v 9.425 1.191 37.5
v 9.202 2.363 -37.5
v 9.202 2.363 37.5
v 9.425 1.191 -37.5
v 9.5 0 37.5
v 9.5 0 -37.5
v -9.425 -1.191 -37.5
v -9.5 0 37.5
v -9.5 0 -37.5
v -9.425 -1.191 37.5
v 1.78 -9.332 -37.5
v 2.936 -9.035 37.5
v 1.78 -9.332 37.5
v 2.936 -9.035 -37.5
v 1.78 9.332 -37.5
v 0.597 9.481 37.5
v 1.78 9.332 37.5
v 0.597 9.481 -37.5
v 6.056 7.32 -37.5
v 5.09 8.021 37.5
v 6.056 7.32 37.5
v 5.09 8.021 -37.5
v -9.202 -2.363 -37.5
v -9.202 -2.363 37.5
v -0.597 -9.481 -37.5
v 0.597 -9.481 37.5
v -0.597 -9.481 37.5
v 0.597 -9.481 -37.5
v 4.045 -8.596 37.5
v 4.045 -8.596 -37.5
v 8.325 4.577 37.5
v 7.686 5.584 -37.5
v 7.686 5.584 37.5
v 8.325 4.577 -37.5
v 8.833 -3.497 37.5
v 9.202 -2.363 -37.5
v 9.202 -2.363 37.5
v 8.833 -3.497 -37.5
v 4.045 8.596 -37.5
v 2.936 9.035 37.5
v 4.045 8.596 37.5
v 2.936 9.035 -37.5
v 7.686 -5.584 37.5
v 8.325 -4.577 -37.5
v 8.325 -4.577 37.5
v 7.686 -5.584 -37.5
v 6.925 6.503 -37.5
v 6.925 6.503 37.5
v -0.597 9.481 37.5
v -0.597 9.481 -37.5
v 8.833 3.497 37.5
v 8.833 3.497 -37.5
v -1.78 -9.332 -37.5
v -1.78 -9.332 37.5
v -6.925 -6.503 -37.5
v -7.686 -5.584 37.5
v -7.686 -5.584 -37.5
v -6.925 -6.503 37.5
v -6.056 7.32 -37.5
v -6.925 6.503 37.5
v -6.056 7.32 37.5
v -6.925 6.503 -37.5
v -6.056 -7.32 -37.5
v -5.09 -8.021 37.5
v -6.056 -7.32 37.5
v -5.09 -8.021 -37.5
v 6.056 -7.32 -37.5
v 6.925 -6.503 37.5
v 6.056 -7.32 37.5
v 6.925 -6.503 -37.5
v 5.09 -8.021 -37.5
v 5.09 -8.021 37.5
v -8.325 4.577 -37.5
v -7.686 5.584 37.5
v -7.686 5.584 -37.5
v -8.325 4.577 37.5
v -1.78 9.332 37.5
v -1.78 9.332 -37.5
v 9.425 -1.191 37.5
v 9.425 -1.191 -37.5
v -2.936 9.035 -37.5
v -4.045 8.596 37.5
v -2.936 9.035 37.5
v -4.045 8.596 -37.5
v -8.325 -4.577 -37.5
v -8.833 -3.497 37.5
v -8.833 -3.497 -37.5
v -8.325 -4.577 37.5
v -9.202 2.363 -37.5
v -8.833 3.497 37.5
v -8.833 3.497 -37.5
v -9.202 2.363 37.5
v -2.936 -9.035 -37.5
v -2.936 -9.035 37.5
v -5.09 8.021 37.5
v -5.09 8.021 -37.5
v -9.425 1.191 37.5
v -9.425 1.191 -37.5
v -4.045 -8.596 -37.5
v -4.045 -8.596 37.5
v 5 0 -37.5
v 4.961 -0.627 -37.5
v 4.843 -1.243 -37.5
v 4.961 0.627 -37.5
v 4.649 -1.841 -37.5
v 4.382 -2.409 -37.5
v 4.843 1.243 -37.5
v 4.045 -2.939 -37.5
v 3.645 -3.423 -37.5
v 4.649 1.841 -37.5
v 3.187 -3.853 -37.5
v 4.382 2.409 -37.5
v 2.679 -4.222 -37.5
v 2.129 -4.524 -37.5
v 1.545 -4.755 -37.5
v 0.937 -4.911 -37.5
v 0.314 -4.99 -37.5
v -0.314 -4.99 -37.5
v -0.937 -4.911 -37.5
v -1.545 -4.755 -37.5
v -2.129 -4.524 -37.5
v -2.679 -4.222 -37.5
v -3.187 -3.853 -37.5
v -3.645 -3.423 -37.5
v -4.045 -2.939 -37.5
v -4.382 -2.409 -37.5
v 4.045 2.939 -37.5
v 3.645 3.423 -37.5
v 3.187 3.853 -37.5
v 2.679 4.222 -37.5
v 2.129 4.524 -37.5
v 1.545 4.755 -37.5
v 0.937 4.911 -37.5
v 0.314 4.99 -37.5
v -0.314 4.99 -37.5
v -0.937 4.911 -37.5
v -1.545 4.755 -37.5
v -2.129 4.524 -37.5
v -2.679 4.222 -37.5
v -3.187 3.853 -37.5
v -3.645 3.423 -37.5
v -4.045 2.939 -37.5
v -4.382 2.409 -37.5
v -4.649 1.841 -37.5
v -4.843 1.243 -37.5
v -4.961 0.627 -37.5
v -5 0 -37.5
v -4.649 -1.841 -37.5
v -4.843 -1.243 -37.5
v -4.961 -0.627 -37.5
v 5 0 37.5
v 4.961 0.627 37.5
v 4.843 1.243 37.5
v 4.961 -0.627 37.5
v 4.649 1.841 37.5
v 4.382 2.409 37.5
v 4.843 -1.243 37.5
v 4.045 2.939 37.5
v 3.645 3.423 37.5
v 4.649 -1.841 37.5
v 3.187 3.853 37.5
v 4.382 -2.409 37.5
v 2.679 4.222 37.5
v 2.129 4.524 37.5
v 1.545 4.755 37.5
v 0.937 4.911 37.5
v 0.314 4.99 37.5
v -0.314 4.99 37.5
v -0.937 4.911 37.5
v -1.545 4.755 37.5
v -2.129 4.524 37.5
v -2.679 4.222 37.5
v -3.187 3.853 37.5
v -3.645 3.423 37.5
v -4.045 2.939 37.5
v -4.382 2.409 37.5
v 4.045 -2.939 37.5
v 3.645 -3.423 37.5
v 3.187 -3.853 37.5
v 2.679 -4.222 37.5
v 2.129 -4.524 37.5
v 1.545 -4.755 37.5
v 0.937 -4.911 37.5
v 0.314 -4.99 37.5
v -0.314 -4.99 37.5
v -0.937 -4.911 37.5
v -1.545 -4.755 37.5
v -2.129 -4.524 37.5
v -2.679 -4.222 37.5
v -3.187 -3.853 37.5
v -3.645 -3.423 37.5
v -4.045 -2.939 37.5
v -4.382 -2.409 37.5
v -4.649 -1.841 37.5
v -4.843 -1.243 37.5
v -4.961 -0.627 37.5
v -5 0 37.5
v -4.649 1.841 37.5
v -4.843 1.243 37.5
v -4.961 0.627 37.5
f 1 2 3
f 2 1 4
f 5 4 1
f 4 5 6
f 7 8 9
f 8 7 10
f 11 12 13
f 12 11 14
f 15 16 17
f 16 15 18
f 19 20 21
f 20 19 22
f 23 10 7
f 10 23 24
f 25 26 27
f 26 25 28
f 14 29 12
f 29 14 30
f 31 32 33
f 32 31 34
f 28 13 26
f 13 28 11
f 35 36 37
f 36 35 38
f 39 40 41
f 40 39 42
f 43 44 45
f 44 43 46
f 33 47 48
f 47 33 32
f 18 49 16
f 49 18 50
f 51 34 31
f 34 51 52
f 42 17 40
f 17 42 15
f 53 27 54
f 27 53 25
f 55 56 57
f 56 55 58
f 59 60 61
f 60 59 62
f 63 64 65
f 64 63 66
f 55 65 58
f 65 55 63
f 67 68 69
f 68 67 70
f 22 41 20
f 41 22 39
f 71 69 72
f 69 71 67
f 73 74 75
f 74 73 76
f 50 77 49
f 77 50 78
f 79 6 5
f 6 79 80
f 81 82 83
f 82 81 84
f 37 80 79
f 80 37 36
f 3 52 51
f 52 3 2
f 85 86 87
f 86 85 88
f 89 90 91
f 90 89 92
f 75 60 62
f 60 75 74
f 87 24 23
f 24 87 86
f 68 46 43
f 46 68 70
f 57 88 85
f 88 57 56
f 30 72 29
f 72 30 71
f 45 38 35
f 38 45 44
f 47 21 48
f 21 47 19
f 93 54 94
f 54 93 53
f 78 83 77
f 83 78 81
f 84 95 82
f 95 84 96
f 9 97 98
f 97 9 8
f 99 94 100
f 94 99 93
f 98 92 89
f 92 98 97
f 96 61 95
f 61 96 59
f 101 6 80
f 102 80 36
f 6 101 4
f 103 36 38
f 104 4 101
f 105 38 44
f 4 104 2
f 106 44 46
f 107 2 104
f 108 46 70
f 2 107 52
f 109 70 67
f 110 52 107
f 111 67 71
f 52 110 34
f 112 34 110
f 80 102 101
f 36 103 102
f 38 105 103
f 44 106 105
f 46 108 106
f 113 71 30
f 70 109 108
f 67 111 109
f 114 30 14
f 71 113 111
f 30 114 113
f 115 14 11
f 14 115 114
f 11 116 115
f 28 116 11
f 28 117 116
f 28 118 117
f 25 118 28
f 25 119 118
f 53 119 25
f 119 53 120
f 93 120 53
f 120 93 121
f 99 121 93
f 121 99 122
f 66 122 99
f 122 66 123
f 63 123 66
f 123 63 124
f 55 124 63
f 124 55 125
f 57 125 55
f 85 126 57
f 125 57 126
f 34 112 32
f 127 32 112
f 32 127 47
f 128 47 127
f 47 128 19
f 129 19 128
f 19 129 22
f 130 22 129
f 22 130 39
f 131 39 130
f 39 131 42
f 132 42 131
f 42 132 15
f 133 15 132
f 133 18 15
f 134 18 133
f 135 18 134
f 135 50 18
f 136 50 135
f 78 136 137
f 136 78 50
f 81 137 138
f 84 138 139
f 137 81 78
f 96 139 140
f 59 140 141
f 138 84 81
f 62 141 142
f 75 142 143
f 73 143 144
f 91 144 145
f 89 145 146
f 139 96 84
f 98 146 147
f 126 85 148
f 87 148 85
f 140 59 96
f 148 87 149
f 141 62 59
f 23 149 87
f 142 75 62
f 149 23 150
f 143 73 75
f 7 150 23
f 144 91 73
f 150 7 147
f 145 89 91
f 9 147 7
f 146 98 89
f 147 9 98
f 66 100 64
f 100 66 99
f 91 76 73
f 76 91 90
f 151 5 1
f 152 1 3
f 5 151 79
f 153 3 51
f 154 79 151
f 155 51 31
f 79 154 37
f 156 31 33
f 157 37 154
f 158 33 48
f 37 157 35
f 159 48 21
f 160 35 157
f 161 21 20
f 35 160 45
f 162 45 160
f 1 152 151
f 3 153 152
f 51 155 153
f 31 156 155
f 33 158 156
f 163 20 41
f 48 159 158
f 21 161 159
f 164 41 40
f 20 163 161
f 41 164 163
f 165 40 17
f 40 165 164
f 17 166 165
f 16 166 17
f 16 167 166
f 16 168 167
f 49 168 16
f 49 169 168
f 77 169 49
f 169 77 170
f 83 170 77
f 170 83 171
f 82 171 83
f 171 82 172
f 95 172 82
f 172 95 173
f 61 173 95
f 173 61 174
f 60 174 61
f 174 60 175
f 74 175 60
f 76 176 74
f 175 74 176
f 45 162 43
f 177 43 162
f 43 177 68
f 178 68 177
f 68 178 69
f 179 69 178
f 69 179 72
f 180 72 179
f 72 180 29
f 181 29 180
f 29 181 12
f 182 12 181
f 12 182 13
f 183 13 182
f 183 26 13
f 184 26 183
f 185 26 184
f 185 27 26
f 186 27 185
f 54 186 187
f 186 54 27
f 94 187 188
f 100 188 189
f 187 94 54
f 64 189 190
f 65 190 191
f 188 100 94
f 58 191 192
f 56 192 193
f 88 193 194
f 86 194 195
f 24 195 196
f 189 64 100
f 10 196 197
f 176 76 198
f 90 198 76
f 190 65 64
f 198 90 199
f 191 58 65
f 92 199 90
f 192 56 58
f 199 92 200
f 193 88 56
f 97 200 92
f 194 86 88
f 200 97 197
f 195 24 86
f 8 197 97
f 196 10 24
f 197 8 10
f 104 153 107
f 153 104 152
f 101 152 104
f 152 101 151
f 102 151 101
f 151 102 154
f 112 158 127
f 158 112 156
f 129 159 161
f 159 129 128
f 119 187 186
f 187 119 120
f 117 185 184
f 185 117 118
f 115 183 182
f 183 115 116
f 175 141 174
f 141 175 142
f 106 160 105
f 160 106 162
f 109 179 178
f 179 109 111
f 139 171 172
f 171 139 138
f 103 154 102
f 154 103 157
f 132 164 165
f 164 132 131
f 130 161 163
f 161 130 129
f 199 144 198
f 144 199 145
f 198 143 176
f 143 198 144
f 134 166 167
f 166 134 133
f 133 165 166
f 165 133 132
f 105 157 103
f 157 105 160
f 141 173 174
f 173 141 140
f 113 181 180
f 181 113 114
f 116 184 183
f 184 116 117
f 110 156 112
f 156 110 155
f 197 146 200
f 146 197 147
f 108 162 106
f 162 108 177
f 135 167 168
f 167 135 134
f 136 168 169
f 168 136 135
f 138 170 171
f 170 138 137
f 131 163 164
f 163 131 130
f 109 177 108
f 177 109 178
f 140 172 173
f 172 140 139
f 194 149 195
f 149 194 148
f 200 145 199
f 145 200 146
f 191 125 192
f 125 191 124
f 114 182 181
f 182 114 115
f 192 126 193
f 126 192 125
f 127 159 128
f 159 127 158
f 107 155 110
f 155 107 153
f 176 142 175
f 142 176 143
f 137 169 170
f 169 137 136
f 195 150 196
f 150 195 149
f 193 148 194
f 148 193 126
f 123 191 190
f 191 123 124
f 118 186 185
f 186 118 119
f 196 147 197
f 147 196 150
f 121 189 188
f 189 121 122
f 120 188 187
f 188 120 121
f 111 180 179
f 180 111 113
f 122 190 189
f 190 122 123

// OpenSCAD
$fn = 50;


difference() {
	union() {
		translate(v = [0, 0, -37.5000000000]) {
			cylinder(h = 75, r = 9.5000000000);
		}
	}
	union() {
		translate(v = [0, 0, -100.0000000000]) {
			cylinder(h = 200, r = 5.0000000000);
		}
	}
}
